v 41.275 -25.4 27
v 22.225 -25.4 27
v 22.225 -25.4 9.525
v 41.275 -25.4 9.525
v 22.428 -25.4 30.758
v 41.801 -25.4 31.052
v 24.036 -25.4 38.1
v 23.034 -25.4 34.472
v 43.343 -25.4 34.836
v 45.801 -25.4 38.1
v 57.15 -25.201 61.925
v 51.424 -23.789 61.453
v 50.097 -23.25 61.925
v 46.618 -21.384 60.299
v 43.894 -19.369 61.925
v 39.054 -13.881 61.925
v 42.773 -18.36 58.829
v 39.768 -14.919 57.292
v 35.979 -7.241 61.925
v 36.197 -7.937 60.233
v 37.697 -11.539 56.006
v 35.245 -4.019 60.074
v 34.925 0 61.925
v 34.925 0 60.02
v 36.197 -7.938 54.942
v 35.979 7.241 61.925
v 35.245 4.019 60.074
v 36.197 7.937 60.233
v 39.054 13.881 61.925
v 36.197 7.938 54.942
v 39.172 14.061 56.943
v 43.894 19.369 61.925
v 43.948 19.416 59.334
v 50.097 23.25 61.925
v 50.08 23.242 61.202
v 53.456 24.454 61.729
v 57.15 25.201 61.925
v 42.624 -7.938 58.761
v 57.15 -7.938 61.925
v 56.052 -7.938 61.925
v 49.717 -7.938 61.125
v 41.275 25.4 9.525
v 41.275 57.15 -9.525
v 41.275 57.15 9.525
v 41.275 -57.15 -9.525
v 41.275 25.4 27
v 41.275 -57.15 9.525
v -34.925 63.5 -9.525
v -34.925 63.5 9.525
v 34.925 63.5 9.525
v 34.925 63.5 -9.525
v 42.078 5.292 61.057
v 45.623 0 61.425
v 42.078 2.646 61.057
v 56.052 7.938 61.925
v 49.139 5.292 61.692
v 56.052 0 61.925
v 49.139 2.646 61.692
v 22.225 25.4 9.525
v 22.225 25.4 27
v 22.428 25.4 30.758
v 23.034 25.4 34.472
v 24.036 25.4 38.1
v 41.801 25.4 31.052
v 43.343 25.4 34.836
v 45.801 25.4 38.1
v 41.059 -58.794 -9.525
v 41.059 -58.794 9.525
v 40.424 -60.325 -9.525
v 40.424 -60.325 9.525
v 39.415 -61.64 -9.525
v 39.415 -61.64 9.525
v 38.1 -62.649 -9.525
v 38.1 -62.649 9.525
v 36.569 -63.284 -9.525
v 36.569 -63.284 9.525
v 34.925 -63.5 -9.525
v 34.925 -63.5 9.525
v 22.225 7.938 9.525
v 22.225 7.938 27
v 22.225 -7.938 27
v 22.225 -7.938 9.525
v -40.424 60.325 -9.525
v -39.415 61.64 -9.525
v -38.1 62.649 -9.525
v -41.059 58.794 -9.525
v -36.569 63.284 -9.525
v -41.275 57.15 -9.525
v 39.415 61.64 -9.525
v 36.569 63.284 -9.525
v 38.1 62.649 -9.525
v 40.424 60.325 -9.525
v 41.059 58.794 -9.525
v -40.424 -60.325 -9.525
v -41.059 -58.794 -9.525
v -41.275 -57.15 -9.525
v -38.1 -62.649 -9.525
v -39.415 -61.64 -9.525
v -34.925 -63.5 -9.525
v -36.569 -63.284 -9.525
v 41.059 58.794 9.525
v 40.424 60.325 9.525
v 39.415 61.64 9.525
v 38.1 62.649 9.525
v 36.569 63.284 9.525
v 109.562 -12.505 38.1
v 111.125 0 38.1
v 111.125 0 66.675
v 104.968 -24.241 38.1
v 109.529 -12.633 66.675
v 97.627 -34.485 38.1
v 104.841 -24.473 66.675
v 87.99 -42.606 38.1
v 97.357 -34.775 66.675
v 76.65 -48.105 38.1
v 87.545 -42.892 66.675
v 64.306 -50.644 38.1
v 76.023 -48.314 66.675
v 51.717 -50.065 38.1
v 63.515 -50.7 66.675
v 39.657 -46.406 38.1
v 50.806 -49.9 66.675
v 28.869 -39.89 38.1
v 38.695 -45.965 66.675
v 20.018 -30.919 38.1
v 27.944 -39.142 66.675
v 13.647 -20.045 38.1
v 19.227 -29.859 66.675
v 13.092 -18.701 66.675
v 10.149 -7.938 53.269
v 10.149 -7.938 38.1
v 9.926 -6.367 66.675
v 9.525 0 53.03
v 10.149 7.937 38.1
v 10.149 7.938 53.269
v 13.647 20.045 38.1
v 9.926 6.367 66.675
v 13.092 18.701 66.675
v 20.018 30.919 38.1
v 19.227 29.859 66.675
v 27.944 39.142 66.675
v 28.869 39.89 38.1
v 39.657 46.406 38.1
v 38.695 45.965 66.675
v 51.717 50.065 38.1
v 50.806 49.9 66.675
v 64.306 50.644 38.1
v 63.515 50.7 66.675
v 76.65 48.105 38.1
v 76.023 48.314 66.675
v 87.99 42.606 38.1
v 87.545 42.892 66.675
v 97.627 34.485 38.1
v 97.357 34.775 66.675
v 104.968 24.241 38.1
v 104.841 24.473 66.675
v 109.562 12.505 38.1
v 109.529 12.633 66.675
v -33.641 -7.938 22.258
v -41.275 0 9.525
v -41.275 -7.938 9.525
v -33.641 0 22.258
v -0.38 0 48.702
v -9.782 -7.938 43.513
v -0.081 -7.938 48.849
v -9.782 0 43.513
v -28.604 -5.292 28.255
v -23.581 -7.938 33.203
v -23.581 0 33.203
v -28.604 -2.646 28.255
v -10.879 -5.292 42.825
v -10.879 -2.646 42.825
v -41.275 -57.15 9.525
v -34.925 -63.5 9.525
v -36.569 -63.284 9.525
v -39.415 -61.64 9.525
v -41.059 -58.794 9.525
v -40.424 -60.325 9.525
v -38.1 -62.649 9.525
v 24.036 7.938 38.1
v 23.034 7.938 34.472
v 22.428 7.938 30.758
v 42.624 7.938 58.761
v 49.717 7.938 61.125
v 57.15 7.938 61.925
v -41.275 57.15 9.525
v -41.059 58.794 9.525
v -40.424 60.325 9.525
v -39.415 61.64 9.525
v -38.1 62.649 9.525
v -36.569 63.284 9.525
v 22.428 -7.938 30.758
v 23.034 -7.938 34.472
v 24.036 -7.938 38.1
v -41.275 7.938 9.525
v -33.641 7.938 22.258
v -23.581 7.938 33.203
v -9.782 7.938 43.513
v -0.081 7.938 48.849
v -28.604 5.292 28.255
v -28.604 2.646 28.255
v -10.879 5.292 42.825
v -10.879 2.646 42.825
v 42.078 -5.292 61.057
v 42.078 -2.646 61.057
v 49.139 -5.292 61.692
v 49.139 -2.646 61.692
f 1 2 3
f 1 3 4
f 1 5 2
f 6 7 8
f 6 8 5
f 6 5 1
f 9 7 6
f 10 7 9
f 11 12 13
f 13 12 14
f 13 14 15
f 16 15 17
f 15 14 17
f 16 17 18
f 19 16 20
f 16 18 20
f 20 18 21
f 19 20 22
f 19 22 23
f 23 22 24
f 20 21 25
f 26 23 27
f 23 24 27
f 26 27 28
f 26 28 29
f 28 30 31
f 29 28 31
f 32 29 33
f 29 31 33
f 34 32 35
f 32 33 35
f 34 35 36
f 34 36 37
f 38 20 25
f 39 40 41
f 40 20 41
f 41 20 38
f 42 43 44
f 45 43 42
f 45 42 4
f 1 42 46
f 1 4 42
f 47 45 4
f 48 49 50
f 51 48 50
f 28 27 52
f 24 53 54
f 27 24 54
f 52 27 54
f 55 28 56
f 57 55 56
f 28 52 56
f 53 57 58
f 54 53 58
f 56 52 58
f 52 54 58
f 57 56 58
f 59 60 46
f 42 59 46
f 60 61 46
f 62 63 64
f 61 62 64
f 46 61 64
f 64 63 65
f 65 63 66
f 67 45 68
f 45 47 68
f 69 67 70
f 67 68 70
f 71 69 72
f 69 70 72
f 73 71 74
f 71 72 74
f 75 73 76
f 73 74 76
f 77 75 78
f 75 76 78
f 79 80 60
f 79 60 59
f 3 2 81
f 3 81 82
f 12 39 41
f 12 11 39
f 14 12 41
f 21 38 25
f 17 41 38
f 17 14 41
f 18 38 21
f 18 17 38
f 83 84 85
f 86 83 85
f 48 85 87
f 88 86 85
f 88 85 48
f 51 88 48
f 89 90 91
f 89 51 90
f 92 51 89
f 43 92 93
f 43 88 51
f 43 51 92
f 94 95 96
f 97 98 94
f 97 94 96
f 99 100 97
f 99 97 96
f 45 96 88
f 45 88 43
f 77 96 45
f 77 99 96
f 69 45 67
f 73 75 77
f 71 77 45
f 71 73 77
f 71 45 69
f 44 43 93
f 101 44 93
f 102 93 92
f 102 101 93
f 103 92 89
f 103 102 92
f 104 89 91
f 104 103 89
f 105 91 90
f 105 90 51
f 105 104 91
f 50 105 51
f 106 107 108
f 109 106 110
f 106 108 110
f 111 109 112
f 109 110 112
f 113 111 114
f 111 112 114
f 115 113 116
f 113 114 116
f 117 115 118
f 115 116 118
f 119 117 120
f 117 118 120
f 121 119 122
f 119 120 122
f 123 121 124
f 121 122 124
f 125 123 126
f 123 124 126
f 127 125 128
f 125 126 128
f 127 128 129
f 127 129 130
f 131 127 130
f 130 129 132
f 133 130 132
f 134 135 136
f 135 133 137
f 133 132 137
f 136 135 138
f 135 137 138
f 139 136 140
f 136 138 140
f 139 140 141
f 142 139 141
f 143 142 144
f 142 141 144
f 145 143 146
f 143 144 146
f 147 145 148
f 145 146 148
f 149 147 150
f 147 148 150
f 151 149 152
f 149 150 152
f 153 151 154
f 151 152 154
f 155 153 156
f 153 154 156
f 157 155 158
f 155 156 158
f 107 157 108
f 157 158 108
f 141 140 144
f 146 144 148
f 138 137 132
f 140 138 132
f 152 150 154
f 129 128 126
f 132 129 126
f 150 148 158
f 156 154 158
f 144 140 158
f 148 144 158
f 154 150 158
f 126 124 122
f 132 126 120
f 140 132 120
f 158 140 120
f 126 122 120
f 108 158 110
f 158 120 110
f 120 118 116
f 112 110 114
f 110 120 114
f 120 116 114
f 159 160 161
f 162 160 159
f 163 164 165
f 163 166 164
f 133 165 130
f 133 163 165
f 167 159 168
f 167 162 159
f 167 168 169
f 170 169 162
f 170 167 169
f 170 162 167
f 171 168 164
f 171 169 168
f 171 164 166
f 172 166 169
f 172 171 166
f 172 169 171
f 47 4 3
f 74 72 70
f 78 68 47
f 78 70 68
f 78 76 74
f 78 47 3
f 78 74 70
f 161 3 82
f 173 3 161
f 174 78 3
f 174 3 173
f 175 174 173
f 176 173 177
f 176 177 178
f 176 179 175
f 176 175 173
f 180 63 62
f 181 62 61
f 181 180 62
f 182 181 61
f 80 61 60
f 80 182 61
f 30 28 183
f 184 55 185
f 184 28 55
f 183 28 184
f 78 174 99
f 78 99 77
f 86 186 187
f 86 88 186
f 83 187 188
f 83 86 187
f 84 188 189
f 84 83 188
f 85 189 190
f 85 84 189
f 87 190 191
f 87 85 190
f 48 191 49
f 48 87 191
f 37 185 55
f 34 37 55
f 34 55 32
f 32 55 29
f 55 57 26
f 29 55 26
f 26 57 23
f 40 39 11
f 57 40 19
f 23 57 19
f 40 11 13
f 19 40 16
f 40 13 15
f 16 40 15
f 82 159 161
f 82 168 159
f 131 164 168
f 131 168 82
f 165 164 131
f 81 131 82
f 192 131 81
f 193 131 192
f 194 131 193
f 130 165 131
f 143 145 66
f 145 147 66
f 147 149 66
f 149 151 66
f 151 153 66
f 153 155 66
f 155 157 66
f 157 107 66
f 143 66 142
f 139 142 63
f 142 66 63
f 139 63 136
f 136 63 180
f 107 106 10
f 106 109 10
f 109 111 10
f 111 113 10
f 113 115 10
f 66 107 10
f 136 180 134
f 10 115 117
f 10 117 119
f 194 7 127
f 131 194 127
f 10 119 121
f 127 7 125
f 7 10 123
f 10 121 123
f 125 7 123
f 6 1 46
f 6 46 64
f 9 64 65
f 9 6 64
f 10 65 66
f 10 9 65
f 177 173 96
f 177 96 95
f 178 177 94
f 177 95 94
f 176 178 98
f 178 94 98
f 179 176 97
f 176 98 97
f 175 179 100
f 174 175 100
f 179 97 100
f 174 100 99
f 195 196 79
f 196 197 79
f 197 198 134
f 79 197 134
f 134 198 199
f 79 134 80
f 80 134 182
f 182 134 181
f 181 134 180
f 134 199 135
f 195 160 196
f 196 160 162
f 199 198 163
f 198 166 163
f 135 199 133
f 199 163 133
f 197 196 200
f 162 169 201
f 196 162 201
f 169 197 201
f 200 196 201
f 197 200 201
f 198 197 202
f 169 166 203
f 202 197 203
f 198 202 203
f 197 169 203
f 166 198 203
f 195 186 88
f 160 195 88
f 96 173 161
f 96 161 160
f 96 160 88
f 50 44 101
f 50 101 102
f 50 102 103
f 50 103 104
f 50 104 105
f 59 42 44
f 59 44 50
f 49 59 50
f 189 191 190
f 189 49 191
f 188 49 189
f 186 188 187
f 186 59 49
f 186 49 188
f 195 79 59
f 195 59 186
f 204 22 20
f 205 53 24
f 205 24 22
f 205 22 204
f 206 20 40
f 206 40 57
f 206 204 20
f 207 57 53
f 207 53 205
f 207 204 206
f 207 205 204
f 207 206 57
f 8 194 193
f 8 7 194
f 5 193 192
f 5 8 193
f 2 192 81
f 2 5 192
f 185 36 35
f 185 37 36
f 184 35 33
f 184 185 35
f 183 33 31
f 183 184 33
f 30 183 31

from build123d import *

# Parameters (mm, degrees)
F1_DEPTH = 63.5
F0_W     = 25.4
F0_H     = 19.05
F2_DEPTH = 25.4
F3_DEPTH = 7.9375
F5_R     = 6.35


with BuildPart() as f1:
    # F0 (on Front) → F1 (new body, symmetric)
    with BuildSketch(Plane.XZ):
        Polygon((41.275, -9.525), (41.275, 9.525), (22.225, 9.525), (-41.275, 9.525), (-41.275, -9.525), align=None)
    extrude(amount=F1_DEPTH, both=True)

    # F0 (on Front) → F2 (join, symmetric)
    with BuildSketch(Plane.XZ):
        with BuildLine():
            Line((22.225, 9.525), (41.275, 9.525))
            Line((41.275, 9.525), (41.275, 27.0002))
            ThreePointArc((41.275, 27.0002), (45.92468, 38.22552), (57.15, 42.8752))
            Line((57.15, 42.8752), (60.325, 42.8752))
            Line((60.325, 42.8752), (60.325, 61.9252))
            Line((60.325, 61.9252), (57.15, 61.9252))
            ThreePointArc((57.15, 61.9252), (32.454296, 51.695904), (22.225, 27.0002))
            Line((22.225, 27.0002), (22.225, 9.525))
        make_face()
        with Locations((73.025, 52.4002)):
            Rectangle(F0_W, F0_H)
    extrude(amount=F2_DEPTH, both=True)

    # F0 (on Front) → F3 (join, symmetric)
    with BuildSketch(Plane.XZ):
        with BuildLine():
            Line((-41.275, 9.525), (22.225, 9.525))
            Line((22.225, 9.525), (22.225, 27.0002))
            ThreePointArc((22.225, 27.0002), (32.454296, 51.695904), (57.15, 61.9252))
            add(Edge.make_bspline(
                [(-41.275, 9.525), (-25.040152, 44.883206), (20.634502, 62.09904), (57.15, 61.9252)],
                knots=[0, 0, 0, 0, 111.504536, 111.504536, 111.504536, 111.504536], degree=3))
        make_face()
    extrude(amount=F3_DEPTH, both=True)

    # F0 (on Front) → F4 (revolve)
    with BuildSketch(Plane.XZ):
        Polygon((85.725, 42.8752), (60.325, 42.8752), (60.325, 38.1), (111.125, 38.1), (111.125, 66.675), (60.325, 66.675), (60.325, 61.9252), (85.725, 61.9252), align=None)
    revolve(axis=Axis((60.325, 0, 52.3875), (0, 0, -1)))

    # F5
    f5_edges = [f1.edges().sort_by_distance(p)[0] for p in [
        (41.275, -63.5, 0),
        (-41.275, -63.5, 0),
        (-41.275, 63.5, 0),
        (41.275, 63.5, 0),
    ]]
    fillet(f5_edges, radius=F5_R)


solid = f1.part
